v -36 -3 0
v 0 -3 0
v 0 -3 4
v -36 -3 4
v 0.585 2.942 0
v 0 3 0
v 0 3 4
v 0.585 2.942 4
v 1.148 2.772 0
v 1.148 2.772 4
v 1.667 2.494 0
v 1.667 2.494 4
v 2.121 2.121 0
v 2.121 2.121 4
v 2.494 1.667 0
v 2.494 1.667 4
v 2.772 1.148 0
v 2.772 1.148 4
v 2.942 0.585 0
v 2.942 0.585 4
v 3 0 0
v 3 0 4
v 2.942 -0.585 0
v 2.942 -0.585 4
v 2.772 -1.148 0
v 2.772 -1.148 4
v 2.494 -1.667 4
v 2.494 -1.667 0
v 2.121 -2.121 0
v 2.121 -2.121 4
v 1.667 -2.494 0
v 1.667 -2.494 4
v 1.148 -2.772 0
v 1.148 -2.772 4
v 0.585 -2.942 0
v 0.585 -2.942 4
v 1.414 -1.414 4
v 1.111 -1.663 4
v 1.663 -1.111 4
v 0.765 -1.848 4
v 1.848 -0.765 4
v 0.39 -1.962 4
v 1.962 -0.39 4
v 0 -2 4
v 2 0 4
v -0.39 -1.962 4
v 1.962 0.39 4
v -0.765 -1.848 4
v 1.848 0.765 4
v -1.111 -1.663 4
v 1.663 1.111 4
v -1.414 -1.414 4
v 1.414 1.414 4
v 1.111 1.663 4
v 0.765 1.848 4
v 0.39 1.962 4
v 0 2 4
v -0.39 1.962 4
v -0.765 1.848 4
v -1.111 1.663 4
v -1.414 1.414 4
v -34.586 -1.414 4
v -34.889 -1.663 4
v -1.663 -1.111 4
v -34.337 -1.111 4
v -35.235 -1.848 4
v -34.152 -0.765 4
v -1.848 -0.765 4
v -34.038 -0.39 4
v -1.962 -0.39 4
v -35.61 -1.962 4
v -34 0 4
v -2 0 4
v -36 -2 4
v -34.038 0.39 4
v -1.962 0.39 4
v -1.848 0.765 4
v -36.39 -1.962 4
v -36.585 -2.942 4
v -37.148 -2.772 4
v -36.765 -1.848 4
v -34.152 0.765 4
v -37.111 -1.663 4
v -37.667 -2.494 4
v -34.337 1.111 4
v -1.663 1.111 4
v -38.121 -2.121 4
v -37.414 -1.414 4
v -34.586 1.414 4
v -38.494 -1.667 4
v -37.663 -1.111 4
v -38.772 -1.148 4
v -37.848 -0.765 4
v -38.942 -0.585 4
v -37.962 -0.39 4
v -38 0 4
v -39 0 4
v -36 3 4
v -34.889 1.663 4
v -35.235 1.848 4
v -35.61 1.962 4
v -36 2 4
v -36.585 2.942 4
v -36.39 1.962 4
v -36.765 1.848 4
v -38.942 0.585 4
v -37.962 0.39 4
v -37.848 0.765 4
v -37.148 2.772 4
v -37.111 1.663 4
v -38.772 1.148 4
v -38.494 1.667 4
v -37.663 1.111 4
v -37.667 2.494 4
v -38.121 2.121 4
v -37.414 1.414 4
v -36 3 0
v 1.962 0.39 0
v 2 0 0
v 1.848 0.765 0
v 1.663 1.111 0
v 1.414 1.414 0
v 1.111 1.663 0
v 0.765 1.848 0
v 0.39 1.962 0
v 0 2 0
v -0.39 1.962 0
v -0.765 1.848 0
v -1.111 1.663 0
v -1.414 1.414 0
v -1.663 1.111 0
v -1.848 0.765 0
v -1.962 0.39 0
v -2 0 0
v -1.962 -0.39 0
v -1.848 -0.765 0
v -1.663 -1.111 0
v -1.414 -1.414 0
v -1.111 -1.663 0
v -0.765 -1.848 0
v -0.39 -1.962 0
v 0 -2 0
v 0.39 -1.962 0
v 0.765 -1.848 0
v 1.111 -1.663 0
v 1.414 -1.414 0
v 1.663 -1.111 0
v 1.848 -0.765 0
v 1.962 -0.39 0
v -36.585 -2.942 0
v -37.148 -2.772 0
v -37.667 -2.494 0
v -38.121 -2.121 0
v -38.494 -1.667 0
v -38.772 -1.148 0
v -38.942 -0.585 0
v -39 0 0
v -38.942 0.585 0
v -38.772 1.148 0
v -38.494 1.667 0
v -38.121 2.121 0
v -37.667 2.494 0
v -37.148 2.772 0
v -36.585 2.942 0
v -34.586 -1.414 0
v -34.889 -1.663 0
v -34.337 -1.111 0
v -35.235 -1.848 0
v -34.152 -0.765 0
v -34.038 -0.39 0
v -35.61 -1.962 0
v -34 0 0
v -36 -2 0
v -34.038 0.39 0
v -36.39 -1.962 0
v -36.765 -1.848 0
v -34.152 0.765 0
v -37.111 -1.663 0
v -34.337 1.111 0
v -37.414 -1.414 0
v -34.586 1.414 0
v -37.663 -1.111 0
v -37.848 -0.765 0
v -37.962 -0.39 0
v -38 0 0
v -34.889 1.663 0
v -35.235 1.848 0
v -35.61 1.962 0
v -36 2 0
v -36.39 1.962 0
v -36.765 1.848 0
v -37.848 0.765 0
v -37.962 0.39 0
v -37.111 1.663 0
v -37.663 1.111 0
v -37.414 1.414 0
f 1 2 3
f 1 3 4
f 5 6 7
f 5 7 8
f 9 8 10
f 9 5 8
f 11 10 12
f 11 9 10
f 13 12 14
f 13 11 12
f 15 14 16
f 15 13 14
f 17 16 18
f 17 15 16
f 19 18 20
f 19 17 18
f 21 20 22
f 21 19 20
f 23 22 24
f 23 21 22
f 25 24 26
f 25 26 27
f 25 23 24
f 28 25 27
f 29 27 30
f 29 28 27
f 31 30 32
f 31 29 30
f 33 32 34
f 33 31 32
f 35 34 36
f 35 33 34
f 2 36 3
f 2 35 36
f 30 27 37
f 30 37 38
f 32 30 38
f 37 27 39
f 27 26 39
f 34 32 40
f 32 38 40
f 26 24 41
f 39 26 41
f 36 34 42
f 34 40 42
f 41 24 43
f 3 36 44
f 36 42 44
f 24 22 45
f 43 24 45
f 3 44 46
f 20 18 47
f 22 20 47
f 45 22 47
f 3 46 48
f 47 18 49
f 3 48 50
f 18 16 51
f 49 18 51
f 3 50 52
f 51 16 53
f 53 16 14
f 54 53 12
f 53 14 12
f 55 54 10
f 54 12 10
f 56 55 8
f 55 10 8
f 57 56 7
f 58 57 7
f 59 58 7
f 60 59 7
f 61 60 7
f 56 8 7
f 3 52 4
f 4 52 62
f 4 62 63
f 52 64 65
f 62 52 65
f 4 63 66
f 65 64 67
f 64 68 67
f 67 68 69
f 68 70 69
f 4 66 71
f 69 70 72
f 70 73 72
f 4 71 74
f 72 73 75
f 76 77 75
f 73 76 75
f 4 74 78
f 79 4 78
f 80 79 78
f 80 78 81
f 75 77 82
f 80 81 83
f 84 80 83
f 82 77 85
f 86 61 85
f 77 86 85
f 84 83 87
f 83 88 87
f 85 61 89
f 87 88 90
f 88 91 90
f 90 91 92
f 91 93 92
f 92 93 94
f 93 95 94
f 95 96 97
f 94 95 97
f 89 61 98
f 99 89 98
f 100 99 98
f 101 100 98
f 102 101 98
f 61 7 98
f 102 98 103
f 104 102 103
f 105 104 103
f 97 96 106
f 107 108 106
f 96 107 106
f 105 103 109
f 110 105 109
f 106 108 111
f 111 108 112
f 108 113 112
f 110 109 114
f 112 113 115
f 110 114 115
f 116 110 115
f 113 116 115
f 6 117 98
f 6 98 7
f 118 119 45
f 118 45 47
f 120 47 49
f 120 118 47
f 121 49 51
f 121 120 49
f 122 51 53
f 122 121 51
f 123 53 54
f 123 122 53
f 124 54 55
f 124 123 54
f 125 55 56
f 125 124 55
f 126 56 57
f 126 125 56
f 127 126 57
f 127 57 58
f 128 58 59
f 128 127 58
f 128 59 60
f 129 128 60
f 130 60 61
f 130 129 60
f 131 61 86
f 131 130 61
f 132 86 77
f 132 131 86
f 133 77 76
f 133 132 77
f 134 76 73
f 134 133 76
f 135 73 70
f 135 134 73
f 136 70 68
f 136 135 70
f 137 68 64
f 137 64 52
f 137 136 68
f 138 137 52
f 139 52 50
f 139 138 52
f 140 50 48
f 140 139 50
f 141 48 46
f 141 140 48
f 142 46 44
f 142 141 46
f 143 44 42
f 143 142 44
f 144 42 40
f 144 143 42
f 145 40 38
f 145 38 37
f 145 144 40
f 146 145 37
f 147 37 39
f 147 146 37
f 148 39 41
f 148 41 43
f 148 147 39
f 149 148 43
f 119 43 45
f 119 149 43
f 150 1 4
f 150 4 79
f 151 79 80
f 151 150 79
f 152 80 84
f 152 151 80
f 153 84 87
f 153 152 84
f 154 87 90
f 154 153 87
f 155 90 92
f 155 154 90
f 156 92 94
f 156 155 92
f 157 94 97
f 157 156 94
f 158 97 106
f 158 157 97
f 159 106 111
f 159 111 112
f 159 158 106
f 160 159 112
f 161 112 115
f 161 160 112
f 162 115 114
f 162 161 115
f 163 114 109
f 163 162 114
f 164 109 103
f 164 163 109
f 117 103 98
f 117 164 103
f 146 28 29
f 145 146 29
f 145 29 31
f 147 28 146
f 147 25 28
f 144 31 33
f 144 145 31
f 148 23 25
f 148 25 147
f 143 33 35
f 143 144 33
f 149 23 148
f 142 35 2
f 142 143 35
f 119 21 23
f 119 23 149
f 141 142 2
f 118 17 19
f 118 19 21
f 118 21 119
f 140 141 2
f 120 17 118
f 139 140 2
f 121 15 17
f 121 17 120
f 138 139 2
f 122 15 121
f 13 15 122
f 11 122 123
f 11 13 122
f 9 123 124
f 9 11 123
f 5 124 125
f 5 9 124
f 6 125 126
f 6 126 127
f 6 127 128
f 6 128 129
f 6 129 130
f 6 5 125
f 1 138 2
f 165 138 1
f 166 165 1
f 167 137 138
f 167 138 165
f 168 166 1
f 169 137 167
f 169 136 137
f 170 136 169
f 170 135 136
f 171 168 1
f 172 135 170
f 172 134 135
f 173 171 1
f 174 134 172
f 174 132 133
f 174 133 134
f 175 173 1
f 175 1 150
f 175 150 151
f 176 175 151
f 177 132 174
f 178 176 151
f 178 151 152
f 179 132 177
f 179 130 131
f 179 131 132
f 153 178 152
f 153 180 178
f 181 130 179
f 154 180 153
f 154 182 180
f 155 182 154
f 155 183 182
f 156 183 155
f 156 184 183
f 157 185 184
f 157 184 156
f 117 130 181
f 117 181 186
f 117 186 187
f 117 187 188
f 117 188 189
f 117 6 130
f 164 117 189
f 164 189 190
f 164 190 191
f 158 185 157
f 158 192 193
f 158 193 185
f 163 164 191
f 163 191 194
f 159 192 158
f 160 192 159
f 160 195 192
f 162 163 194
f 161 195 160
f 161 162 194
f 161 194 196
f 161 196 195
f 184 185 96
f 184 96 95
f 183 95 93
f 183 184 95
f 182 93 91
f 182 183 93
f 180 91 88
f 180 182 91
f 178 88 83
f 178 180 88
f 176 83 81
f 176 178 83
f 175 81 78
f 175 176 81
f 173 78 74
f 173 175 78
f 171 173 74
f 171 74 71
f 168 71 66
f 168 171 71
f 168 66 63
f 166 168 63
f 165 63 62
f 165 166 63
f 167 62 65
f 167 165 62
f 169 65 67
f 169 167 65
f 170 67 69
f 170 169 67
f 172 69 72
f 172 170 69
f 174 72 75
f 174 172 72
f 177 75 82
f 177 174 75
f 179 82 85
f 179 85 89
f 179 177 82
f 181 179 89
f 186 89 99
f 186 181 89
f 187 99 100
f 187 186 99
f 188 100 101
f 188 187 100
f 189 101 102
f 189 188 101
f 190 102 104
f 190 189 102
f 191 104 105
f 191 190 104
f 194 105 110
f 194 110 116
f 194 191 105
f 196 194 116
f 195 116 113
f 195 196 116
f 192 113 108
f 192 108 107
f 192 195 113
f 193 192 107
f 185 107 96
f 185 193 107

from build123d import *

# Parameters (mm, degrees)
SKETCH1_R           = 2
BOSS_EXTRUDE1_DEPTH = 4


with BuildPart() as part:
    # Sketch1 → Boss-Extrude1 (new body)
    with BuildSketch(Plane.XY):
        with BuildLine():
            Line((-36, 3), (0, 3))
            ThreePointArc((0, 3), (3, 0), (0, -3))
            Line((0, -3), (-36, -3))
            ThreePointArc((-36, -3), (-39, 0), (-36, 3))
        make_face()
        Circle(SKETCH1_R, mode=Mode.SUBTRACT)
        with Locations(Location((-36, 0, 0), (0, 0, 180))):
            Circle(SKETCH1_R, mode=Mode.SUBTRACT)
    extrude(amount=BOSS_EXTRUDE1_DEPTH)


solid = part.part
